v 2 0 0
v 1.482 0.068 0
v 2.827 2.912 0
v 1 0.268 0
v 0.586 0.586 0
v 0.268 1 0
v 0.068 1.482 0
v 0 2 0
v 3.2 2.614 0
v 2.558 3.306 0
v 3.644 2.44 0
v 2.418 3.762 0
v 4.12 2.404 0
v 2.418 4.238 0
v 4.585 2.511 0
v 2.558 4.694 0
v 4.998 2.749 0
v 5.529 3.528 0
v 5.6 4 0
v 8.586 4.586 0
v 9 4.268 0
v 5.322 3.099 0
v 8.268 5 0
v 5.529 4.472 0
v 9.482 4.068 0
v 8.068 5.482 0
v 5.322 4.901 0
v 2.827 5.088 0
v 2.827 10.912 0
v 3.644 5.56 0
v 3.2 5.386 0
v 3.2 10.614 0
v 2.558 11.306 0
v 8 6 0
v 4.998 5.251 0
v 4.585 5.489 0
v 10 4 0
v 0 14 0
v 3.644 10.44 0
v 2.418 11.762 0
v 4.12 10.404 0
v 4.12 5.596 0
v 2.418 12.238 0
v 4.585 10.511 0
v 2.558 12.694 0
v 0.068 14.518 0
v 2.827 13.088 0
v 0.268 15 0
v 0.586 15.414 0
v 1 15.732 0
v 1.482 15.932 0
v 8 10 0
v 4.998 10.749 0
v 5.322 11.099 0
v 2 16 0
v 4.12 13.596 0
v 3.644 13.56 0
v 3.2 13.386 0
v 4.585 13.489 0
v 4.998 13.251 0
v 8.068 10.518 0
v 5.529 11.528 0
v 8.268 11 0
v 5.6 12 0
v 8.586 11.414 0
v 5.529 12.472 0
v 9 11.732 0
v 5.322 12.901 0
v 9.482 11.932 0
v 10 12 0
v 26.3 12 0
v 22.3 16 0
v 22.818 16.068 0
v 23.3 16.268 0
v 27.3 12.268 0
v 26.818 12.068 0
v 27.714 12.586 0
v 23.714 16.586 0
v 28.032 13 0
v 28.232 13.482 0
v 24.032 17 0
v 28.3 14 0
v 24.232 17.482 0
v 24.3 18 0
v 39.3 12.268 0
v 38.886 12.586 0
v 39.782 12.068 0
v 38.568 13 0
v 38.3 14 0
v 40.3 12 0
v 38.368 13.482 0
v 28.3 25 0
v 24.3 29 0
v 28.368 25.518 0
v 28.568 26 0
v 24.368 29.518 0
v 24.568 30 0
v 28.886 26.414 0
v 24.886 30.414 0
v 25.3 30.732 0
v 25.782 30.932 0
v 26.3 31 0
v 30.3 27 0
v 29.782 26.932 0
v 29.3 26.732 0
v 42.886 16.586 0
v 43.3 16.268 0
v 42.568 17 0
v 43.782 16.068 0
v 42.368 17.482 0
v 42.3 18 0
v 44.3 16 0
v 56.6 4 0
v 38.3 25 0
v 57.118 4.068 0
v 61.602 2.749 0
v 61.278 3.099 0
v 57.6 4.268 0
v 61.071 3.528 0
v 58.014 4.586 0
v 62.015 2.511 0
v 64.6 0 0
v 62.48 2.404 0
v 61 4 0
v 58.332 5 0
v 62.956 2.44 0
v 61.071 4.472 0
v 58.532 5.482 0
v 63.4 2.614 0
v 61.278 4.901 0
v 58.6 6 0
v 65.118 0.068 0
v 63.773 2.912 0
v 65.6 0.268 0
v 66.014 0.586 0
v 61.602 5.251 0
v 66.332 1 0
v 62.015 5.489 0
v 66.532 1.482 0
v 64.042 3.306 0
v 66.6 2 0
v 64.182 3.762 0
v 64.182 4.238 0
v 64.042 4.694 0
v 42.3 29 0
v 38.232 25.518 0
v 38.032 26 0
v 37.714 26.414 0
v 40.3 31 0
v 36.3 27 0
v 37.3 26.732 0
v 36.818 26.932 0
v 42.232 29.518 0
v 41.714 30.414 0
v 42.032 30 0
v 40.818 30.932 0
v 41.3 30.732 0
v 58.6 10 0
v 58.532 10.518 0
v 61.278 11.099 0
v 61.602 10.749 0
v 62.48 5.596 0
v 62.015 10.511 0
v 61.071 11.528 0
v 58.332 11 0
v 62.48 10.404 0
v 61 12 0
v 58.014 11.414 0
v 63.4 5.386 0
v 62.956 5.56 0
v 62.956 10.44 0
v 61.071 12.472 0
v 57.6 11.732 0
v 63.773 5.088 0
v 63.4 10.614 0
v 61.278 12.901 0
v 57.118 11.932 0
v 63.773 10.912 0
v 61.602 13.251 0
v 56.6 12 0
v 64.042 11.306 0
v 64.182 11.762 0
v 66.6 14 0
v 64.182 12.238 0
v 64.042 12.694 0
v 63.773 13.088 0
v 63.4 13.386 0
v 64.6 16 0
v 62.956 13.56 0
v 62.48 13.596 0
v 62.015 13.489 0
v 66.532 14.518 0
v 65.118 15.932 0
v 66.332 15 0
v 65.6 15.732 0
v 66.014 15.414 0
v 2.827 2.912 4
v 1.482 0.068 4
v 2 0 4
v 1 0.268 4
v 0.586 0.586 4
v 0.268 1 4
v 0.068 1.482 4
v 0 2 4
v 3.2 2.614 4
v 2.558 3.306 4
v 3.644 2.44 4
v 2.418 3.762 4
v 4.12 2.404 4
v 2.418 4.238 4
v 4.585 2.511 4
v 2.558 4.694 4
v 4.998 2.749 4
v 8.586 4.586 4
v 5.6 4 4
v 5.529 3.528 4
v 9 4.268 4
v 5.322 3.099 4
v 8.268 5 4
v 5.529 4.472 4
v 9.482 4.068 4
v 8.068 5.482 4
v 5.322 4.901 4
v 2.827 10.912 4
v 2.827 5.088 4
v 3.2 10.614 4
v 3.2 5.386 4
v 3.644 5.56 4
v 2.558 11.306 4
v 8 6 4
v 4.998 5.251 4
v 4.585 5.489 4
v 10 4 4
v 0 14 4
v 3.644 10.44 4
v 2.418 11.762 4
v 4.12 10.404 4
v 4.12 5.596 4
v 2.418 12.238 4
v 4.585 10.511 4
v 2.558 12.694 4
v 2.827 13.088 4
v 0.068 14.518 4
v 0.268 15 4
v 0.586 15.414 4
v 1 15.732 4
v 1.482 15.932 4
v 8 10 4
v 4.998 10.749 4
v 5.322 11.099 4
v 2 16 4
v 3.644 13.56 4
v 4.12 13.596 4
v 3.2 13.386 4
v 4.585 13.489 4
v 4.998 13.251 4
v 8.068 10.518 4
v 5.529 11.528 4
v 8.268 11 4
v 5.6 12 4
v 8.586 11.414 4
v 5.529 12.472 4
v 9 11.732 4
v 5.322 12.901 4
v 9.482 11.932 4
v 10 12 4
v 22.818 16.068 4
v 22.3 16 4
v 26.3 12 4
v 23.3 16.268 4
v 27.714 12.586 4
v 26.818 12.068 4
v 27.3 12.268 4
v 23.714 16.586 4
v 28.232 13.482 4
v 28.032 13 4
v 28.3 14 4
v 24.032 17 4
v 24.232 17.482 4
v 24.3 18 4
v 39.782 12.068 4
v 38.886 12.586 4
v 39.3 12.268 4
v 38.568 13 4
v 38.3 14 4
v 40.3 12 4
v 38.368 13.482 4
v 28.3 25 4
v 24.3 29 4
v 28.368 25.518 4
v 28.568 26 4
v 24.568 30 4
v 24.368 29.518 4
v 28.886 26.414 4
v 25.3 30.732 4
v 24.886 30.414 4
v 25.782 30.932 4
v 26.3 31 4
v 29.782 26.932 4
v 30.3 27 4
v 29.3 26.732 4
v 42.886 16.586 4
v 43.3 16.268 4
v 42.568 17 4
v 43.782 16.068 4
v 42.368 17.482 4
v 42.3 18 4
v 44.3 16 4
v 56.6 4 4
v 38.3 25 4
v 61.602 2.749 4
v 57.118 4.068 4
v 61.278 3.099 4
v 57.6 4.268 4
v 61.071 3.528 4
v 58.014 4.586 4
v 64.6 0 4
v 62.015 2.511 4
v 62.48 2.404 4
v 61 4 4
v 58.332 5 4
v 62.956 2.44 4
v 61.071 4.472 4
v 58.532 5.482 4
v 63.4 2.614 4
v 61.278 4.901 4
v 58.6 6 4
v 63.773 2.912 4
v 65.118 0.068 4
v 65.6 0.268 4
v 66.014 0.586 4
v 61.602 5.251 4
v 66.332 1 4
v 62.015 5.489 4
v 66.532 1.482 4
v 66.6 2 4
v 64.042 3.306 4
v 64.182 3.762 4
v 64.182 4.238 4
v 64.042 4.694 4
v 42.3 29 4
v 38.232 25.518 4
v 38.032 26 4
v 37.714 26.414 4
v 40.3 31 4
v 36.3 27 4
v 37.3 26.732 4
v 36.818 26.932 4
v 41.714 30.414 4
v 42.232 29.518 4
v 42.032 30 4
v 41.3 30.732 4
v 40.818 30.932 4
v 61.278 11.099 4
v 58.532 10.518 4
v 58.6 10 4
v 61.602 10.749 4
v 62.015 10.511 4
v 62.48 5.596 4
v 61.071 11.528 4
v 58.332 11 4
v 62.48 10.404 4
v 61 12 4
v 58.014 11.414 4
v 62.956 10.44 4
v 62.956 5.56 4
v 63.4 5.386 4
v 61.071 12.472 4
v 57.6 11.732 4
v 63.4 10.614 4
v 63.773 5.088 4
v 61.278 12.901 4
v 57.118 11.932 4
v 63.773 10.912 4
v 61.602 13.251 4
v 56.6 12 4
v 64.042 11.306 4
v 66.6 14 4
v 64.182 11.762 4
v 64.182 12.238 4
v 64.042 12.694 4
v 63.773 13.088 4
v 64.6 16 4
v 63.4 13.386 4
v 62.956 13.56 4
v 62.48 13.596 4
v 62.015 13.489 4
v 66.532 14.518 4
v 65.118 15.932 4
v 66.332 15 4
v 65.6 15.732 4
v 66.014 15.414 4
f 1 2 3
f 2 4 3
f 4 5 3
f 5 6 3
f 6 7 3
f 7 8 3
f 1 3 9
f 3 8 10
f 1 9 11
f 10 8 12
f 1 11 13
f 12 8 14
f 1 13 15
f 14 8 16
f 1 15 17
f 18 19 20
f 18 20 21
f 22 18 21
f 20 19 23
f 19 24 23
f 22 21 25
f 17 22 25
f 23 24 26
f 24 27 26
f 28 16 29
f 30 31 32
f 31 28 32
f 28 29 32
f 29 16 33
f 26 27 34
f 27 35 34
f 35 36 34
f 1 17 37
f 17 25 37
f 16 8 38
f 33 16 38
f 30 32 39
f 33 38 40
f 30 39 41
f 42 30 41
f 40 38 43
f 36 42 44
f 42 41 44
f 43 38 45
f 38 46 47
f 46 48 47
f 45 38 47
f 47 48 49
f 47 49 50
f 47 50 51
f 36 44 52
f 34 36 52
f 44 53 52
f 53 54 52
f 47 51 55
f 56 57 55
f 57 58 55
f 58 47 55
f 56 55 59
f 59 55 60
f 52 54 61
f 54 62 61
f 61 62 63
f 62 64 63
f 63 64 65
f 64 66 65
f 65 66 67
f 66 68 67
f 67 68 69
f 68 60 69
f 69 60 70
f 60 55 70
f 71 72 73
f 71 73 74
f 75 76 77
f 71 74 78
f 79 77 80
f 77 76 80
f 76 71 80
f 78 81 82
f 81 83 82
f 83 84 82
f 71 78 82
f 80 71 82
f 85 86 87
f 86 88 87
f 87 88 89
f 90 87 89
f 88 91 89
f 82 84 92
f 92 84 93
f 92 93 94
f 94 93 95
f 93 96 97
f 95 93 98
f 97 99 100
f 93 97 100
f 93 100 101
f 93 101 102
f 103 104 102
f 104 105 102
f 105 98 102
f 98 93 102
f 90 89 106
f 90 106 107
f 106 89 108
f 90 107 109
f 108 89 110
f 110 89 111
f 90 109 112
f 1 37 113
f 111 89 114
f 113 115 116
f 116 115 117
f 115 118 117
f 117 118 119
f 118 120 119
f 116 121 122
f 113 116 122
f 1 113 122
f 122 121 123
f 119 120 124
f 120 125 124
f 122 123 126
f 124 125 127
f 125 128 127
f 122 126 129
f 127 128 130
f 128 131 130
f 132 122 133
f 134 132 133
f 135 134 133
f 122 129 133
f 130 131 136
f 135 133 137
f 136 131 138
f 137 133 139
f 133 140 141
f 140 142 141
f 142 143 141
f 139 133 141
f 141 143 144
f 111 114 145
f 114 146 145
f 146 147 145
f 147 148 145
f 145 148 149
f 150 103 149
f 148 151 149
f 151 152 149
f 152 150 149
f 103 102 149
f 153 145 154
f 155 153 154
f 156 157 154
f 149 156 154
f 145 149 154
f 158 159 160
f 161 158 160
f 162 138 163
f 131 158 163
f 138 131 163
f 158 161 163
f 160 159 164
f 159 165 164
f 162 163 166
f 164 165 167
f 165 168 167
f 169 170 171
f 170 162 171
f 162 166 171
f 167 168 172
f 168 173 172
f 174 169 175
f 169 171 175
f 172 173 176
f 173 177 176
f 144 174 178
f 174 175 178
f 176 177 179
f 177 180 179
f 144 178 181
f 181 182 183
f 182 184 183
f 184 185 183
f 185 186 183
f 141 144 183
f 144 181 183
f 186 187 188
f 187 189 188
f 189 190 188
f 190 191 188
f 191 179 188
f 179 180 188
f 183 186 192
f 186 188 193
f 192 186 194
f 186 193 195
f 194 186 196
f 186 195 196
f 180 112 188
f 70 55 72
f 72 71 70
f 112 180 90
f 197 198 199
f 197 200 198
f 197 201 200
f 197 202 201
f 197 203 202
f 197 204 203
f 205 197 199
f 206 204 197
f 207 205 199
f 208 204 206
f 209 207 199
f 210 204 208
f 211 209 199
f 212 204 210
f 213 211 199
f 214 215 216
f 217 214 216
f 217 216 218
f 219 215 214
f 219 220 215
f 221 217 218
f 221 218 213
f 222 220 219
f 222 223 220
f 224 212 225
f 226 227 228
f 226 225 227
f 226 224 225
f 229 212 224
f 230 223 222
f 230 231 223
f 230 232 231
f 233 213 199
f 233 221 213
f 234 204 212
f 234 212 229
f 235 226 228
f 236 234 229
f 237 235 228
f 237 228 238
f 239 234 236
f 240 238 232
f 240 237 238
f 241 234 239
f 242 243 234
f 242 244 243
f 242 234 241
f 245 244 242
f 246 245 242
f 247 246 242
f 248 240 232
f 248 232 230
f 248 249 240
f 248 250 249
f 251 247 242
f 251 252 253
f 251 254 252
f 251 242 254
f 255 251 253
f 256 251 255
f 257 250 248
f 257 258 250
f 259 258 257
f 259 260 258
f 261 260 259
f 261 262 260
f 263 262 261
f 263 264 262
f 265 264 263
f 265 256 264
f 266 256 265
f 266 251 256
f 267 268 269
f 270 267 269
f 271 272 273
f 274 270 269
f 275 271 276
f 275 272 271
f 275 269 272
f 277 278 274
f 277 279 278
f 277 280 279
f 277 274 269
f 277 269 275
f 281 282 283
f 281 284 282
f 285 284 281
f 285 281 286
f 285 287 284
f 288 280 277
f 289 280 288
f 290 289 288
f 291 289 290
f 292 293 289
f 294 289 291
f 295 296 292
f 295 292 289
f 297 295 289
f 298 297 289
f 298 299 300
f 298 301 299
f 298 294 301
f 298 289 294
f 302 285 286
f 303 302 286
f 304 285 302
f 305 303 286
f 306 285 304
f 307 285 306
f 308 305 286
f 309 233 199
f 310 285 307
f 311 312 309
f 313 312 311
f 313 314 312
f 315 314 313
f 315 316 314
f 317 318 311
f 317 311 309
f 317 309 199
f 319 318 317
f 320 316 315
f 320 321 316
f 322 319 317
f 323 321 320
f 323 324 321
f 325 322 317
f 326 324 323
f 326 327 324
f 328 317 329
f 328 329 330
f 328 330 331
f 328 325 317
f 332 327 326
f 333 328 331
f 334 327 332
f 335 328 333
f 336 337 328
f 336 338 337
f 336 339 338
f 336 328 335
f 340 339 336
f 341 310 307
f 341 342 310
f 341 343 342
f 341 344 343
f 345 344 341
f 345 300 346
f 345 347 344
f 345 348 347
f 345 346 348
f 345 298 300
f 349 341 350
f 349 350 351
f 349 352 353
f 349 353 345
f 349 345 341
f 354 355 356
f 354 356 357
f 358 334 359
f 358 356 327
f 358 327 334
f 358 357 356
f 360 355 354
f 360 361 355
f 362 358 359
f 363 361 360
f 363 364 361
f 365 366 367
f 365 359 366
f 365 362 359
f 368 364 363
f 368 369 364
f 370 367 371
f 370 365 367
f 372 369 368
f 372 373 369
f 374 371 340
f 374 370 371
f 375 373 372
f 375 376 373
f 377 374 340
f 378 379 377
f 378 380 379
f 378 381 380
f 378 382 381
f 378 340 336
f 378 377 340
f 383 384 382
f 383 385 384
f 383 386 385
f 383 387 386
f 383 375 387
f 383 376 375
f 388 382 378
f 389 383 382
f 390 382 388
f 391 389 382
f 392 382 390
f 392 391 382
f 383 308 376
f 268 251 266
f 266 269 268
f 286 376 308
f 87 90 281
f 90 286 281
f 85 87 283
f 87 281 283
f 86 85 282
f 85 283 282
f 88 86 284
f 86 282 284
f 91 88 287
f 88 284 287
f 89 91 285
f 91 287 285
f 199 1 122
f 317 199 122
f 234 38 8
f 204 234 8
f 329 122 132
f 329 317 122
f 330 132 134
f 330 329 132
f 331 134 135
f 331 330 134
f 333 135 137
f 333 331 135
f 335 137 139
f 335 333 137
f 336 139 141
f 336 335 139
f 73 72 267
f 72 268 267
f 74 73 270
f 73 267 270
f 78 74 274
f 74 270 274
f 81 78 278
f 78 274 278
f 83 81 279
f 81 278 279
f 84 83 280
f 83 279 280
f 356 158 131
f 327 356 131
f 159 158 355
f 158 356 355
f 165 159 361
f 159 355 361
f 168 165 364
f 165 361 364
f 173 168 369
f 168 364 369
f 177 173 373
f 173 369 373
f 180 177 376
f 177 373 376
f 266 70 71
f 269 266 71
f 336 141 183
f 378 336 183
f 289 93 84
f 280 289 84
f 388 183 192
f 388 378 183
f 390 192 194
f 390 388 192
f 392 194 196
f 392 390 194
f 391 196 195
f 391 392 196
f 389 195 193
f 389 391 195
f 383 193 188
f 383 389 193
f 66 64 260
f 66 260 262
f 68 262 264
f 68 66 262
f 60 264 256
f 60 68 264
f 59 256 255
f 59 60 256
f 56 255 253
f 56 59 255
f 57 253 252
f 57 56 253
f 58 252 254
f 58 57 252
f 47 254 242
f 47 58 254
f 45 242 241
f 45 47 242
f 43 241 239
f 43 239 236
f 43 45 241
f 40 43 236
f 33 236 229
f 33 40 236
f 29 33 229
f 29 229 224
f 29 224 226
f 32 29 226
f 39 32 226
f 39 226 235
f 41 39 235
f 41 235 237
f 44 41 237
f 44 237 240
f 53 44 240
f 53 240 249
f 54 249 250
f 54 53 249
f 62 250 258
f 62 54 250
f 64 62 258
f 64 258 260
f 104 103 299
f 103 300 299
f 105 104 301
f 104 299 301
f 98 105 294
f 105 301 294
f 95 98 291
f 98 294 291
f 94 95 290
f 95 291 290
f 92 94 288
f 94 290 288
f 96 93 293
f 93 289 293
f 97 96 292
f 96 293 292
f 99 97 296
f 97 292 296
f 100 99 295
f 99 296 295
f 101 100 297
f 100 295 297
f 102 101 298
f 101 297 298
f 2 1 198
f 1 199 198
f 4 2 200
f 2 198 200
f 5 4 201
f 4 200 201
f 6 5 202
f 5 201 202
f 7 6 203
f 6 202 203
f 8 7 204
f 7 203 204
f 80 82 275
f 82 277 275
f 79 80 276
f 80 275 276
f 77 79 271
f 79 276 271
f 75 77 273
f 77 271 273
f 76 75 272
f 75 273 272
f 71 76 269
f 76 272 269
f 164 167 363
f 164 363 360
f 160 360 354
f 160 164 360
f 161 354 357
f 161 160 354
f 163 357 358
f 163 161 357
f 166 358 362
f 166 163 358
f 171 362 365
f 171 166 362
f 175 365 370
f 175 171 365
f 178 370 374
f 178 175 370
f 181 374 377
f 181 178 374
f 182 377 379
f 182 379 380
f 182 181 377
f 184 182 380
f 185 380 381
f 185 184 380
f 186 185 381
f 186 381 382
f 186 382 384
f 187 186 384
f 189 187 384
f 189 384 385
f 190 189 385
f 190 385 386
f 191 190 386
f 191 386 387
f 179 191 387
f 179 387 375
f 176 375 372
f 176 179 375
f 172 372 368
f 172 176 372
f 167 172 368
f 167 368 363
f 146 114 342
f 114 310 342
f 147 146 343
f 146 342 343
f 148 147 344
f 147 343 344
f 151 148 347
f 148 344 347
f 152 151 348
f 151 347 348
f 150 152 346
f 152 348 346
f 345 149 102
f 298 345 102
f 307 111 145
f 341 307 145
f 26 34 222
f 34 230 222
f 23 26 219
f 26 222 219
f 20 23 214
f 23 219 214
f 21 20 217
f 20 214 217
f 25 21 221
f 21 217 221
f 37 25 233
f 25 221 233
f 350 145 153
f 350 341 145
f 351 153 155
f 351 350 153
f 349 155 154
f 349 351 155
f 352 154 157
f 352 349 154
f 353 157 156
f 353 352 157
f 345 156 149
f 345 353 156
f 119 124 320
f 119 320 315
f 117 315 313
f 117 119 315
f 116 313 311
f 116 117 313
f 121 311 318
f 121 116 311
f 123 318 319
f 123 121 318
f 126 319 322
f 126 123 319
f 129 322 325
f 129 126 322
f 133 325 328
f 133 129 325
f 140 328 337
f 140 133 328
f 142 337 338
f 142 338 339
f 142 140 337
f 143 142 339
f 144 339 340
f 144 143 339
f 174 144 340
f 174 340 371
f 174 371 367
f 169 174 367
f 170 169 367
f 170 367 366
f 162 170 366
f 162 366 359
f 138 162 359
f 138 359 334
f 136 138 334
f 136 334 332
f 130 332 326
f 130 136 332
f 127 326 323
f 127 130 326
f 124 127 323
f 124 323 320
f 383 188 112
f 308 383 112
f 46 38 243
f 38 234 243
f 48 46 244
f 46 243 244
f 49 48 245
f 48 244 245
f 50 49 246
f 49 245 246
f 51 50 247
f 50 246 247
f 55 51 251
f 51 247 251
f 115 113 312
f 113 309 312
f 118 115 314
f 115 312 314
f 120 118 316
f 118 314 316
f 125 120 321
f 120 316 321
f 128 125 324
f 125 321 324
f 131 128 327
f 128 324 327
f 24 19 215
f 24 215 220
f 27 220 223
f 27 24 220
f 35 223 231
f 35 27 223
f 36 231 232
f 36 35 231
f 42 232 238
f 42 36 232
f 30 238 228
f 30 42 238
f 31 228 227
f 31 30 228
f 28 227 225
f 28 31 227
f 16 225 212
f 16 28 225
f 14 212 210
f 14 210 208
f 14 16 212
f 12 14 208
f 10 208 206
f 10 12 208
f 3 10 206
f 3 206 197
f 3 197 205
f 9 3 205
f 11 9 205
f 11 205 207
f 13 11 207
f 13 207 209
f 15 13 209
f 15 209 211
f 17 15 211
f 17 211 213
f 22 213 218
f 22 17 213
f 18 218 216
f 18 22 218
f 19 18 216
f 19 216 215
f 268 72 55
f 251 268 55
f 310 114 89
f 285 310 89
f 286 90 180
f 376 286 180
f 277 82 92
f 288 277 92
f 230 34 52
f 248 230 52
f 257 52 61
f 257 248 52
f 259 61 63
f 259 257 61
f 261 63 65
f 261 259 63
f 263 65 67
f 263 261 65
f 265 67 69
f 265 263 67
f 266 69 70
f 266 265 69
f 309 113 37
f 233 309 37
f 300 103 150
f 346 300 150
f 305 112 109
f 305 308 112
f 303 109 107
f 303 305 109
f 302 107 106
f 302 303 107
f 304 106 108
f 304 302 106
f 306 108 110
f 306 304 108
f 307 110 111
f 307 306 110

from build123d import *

# Parameters (mm, degrees)
SKETCH_1_R      = 1.6
EXTRUDE_1_DEPTH = 4
FILLET_1_R      = 2


with BuildPart() as part:
    # 草图1 → 凸台-拉伸1 (new body)
    with BuildSketch(Plane.XY):
        Polygon((0, 0), (66.6, 0), (66.6, 16), (42.3, 16), (42.3, 31), (24.3, 31), (24.3, 16), (0, 16), align=None)
        with Locations((4, 4)):
            Circle(SKETCH_1_R, mode=Mode.SUBTRACT)
        with Locations((4, 12)):
            Circle(SKETCH_1_R, mode=Mode.SUBTRACT)
        with Locations(Location((62.6, 12, 0), (0, 0, 180))):
            Circle(SKETCH_1_R, mode=Mode.SUBTRACT)
        with Locations(Location((62.6, 4, 0), (0, 0, 180))):
            Circle(SKETCH_1_R, mode=Mode.SUBTRACT)
        Polygon((8, 12), (28.3, 12), (28.3, 27), (38.3, 27), (38.3, 12), (58.6, 12), (58.6, 4), (8, 4), align=None, mode=Mode.SUBTRACT)
    extrude(amount=EXTRUDE_1_DEPTH)

    # 圆角1
    fillet_1_edges = [part.edges().sort_by_distance(p)[0] for p in [
        (0, 16, 2),
        (24.3, 16, 2),
        (24.3, 31, 2),
        (42.3, 31, 2),
        (42.3, 16, 2),
        (66.6, 16, 2),
        (66.6, 0, 2),
        (0, 0, 2),
        (58.6, 4, 2),
        (58.6, 12, 2),
        (38.3, 12, 2),
        (38.3, 27, 2),
        (28.3, 27, 2),
        (28.3, 12, 2),
        (8, 12, 2),
        (8, 4, 2),
    ]]
    fillet(fillet_1_edges, radius=FILLET_1_R)


solid = part.part
